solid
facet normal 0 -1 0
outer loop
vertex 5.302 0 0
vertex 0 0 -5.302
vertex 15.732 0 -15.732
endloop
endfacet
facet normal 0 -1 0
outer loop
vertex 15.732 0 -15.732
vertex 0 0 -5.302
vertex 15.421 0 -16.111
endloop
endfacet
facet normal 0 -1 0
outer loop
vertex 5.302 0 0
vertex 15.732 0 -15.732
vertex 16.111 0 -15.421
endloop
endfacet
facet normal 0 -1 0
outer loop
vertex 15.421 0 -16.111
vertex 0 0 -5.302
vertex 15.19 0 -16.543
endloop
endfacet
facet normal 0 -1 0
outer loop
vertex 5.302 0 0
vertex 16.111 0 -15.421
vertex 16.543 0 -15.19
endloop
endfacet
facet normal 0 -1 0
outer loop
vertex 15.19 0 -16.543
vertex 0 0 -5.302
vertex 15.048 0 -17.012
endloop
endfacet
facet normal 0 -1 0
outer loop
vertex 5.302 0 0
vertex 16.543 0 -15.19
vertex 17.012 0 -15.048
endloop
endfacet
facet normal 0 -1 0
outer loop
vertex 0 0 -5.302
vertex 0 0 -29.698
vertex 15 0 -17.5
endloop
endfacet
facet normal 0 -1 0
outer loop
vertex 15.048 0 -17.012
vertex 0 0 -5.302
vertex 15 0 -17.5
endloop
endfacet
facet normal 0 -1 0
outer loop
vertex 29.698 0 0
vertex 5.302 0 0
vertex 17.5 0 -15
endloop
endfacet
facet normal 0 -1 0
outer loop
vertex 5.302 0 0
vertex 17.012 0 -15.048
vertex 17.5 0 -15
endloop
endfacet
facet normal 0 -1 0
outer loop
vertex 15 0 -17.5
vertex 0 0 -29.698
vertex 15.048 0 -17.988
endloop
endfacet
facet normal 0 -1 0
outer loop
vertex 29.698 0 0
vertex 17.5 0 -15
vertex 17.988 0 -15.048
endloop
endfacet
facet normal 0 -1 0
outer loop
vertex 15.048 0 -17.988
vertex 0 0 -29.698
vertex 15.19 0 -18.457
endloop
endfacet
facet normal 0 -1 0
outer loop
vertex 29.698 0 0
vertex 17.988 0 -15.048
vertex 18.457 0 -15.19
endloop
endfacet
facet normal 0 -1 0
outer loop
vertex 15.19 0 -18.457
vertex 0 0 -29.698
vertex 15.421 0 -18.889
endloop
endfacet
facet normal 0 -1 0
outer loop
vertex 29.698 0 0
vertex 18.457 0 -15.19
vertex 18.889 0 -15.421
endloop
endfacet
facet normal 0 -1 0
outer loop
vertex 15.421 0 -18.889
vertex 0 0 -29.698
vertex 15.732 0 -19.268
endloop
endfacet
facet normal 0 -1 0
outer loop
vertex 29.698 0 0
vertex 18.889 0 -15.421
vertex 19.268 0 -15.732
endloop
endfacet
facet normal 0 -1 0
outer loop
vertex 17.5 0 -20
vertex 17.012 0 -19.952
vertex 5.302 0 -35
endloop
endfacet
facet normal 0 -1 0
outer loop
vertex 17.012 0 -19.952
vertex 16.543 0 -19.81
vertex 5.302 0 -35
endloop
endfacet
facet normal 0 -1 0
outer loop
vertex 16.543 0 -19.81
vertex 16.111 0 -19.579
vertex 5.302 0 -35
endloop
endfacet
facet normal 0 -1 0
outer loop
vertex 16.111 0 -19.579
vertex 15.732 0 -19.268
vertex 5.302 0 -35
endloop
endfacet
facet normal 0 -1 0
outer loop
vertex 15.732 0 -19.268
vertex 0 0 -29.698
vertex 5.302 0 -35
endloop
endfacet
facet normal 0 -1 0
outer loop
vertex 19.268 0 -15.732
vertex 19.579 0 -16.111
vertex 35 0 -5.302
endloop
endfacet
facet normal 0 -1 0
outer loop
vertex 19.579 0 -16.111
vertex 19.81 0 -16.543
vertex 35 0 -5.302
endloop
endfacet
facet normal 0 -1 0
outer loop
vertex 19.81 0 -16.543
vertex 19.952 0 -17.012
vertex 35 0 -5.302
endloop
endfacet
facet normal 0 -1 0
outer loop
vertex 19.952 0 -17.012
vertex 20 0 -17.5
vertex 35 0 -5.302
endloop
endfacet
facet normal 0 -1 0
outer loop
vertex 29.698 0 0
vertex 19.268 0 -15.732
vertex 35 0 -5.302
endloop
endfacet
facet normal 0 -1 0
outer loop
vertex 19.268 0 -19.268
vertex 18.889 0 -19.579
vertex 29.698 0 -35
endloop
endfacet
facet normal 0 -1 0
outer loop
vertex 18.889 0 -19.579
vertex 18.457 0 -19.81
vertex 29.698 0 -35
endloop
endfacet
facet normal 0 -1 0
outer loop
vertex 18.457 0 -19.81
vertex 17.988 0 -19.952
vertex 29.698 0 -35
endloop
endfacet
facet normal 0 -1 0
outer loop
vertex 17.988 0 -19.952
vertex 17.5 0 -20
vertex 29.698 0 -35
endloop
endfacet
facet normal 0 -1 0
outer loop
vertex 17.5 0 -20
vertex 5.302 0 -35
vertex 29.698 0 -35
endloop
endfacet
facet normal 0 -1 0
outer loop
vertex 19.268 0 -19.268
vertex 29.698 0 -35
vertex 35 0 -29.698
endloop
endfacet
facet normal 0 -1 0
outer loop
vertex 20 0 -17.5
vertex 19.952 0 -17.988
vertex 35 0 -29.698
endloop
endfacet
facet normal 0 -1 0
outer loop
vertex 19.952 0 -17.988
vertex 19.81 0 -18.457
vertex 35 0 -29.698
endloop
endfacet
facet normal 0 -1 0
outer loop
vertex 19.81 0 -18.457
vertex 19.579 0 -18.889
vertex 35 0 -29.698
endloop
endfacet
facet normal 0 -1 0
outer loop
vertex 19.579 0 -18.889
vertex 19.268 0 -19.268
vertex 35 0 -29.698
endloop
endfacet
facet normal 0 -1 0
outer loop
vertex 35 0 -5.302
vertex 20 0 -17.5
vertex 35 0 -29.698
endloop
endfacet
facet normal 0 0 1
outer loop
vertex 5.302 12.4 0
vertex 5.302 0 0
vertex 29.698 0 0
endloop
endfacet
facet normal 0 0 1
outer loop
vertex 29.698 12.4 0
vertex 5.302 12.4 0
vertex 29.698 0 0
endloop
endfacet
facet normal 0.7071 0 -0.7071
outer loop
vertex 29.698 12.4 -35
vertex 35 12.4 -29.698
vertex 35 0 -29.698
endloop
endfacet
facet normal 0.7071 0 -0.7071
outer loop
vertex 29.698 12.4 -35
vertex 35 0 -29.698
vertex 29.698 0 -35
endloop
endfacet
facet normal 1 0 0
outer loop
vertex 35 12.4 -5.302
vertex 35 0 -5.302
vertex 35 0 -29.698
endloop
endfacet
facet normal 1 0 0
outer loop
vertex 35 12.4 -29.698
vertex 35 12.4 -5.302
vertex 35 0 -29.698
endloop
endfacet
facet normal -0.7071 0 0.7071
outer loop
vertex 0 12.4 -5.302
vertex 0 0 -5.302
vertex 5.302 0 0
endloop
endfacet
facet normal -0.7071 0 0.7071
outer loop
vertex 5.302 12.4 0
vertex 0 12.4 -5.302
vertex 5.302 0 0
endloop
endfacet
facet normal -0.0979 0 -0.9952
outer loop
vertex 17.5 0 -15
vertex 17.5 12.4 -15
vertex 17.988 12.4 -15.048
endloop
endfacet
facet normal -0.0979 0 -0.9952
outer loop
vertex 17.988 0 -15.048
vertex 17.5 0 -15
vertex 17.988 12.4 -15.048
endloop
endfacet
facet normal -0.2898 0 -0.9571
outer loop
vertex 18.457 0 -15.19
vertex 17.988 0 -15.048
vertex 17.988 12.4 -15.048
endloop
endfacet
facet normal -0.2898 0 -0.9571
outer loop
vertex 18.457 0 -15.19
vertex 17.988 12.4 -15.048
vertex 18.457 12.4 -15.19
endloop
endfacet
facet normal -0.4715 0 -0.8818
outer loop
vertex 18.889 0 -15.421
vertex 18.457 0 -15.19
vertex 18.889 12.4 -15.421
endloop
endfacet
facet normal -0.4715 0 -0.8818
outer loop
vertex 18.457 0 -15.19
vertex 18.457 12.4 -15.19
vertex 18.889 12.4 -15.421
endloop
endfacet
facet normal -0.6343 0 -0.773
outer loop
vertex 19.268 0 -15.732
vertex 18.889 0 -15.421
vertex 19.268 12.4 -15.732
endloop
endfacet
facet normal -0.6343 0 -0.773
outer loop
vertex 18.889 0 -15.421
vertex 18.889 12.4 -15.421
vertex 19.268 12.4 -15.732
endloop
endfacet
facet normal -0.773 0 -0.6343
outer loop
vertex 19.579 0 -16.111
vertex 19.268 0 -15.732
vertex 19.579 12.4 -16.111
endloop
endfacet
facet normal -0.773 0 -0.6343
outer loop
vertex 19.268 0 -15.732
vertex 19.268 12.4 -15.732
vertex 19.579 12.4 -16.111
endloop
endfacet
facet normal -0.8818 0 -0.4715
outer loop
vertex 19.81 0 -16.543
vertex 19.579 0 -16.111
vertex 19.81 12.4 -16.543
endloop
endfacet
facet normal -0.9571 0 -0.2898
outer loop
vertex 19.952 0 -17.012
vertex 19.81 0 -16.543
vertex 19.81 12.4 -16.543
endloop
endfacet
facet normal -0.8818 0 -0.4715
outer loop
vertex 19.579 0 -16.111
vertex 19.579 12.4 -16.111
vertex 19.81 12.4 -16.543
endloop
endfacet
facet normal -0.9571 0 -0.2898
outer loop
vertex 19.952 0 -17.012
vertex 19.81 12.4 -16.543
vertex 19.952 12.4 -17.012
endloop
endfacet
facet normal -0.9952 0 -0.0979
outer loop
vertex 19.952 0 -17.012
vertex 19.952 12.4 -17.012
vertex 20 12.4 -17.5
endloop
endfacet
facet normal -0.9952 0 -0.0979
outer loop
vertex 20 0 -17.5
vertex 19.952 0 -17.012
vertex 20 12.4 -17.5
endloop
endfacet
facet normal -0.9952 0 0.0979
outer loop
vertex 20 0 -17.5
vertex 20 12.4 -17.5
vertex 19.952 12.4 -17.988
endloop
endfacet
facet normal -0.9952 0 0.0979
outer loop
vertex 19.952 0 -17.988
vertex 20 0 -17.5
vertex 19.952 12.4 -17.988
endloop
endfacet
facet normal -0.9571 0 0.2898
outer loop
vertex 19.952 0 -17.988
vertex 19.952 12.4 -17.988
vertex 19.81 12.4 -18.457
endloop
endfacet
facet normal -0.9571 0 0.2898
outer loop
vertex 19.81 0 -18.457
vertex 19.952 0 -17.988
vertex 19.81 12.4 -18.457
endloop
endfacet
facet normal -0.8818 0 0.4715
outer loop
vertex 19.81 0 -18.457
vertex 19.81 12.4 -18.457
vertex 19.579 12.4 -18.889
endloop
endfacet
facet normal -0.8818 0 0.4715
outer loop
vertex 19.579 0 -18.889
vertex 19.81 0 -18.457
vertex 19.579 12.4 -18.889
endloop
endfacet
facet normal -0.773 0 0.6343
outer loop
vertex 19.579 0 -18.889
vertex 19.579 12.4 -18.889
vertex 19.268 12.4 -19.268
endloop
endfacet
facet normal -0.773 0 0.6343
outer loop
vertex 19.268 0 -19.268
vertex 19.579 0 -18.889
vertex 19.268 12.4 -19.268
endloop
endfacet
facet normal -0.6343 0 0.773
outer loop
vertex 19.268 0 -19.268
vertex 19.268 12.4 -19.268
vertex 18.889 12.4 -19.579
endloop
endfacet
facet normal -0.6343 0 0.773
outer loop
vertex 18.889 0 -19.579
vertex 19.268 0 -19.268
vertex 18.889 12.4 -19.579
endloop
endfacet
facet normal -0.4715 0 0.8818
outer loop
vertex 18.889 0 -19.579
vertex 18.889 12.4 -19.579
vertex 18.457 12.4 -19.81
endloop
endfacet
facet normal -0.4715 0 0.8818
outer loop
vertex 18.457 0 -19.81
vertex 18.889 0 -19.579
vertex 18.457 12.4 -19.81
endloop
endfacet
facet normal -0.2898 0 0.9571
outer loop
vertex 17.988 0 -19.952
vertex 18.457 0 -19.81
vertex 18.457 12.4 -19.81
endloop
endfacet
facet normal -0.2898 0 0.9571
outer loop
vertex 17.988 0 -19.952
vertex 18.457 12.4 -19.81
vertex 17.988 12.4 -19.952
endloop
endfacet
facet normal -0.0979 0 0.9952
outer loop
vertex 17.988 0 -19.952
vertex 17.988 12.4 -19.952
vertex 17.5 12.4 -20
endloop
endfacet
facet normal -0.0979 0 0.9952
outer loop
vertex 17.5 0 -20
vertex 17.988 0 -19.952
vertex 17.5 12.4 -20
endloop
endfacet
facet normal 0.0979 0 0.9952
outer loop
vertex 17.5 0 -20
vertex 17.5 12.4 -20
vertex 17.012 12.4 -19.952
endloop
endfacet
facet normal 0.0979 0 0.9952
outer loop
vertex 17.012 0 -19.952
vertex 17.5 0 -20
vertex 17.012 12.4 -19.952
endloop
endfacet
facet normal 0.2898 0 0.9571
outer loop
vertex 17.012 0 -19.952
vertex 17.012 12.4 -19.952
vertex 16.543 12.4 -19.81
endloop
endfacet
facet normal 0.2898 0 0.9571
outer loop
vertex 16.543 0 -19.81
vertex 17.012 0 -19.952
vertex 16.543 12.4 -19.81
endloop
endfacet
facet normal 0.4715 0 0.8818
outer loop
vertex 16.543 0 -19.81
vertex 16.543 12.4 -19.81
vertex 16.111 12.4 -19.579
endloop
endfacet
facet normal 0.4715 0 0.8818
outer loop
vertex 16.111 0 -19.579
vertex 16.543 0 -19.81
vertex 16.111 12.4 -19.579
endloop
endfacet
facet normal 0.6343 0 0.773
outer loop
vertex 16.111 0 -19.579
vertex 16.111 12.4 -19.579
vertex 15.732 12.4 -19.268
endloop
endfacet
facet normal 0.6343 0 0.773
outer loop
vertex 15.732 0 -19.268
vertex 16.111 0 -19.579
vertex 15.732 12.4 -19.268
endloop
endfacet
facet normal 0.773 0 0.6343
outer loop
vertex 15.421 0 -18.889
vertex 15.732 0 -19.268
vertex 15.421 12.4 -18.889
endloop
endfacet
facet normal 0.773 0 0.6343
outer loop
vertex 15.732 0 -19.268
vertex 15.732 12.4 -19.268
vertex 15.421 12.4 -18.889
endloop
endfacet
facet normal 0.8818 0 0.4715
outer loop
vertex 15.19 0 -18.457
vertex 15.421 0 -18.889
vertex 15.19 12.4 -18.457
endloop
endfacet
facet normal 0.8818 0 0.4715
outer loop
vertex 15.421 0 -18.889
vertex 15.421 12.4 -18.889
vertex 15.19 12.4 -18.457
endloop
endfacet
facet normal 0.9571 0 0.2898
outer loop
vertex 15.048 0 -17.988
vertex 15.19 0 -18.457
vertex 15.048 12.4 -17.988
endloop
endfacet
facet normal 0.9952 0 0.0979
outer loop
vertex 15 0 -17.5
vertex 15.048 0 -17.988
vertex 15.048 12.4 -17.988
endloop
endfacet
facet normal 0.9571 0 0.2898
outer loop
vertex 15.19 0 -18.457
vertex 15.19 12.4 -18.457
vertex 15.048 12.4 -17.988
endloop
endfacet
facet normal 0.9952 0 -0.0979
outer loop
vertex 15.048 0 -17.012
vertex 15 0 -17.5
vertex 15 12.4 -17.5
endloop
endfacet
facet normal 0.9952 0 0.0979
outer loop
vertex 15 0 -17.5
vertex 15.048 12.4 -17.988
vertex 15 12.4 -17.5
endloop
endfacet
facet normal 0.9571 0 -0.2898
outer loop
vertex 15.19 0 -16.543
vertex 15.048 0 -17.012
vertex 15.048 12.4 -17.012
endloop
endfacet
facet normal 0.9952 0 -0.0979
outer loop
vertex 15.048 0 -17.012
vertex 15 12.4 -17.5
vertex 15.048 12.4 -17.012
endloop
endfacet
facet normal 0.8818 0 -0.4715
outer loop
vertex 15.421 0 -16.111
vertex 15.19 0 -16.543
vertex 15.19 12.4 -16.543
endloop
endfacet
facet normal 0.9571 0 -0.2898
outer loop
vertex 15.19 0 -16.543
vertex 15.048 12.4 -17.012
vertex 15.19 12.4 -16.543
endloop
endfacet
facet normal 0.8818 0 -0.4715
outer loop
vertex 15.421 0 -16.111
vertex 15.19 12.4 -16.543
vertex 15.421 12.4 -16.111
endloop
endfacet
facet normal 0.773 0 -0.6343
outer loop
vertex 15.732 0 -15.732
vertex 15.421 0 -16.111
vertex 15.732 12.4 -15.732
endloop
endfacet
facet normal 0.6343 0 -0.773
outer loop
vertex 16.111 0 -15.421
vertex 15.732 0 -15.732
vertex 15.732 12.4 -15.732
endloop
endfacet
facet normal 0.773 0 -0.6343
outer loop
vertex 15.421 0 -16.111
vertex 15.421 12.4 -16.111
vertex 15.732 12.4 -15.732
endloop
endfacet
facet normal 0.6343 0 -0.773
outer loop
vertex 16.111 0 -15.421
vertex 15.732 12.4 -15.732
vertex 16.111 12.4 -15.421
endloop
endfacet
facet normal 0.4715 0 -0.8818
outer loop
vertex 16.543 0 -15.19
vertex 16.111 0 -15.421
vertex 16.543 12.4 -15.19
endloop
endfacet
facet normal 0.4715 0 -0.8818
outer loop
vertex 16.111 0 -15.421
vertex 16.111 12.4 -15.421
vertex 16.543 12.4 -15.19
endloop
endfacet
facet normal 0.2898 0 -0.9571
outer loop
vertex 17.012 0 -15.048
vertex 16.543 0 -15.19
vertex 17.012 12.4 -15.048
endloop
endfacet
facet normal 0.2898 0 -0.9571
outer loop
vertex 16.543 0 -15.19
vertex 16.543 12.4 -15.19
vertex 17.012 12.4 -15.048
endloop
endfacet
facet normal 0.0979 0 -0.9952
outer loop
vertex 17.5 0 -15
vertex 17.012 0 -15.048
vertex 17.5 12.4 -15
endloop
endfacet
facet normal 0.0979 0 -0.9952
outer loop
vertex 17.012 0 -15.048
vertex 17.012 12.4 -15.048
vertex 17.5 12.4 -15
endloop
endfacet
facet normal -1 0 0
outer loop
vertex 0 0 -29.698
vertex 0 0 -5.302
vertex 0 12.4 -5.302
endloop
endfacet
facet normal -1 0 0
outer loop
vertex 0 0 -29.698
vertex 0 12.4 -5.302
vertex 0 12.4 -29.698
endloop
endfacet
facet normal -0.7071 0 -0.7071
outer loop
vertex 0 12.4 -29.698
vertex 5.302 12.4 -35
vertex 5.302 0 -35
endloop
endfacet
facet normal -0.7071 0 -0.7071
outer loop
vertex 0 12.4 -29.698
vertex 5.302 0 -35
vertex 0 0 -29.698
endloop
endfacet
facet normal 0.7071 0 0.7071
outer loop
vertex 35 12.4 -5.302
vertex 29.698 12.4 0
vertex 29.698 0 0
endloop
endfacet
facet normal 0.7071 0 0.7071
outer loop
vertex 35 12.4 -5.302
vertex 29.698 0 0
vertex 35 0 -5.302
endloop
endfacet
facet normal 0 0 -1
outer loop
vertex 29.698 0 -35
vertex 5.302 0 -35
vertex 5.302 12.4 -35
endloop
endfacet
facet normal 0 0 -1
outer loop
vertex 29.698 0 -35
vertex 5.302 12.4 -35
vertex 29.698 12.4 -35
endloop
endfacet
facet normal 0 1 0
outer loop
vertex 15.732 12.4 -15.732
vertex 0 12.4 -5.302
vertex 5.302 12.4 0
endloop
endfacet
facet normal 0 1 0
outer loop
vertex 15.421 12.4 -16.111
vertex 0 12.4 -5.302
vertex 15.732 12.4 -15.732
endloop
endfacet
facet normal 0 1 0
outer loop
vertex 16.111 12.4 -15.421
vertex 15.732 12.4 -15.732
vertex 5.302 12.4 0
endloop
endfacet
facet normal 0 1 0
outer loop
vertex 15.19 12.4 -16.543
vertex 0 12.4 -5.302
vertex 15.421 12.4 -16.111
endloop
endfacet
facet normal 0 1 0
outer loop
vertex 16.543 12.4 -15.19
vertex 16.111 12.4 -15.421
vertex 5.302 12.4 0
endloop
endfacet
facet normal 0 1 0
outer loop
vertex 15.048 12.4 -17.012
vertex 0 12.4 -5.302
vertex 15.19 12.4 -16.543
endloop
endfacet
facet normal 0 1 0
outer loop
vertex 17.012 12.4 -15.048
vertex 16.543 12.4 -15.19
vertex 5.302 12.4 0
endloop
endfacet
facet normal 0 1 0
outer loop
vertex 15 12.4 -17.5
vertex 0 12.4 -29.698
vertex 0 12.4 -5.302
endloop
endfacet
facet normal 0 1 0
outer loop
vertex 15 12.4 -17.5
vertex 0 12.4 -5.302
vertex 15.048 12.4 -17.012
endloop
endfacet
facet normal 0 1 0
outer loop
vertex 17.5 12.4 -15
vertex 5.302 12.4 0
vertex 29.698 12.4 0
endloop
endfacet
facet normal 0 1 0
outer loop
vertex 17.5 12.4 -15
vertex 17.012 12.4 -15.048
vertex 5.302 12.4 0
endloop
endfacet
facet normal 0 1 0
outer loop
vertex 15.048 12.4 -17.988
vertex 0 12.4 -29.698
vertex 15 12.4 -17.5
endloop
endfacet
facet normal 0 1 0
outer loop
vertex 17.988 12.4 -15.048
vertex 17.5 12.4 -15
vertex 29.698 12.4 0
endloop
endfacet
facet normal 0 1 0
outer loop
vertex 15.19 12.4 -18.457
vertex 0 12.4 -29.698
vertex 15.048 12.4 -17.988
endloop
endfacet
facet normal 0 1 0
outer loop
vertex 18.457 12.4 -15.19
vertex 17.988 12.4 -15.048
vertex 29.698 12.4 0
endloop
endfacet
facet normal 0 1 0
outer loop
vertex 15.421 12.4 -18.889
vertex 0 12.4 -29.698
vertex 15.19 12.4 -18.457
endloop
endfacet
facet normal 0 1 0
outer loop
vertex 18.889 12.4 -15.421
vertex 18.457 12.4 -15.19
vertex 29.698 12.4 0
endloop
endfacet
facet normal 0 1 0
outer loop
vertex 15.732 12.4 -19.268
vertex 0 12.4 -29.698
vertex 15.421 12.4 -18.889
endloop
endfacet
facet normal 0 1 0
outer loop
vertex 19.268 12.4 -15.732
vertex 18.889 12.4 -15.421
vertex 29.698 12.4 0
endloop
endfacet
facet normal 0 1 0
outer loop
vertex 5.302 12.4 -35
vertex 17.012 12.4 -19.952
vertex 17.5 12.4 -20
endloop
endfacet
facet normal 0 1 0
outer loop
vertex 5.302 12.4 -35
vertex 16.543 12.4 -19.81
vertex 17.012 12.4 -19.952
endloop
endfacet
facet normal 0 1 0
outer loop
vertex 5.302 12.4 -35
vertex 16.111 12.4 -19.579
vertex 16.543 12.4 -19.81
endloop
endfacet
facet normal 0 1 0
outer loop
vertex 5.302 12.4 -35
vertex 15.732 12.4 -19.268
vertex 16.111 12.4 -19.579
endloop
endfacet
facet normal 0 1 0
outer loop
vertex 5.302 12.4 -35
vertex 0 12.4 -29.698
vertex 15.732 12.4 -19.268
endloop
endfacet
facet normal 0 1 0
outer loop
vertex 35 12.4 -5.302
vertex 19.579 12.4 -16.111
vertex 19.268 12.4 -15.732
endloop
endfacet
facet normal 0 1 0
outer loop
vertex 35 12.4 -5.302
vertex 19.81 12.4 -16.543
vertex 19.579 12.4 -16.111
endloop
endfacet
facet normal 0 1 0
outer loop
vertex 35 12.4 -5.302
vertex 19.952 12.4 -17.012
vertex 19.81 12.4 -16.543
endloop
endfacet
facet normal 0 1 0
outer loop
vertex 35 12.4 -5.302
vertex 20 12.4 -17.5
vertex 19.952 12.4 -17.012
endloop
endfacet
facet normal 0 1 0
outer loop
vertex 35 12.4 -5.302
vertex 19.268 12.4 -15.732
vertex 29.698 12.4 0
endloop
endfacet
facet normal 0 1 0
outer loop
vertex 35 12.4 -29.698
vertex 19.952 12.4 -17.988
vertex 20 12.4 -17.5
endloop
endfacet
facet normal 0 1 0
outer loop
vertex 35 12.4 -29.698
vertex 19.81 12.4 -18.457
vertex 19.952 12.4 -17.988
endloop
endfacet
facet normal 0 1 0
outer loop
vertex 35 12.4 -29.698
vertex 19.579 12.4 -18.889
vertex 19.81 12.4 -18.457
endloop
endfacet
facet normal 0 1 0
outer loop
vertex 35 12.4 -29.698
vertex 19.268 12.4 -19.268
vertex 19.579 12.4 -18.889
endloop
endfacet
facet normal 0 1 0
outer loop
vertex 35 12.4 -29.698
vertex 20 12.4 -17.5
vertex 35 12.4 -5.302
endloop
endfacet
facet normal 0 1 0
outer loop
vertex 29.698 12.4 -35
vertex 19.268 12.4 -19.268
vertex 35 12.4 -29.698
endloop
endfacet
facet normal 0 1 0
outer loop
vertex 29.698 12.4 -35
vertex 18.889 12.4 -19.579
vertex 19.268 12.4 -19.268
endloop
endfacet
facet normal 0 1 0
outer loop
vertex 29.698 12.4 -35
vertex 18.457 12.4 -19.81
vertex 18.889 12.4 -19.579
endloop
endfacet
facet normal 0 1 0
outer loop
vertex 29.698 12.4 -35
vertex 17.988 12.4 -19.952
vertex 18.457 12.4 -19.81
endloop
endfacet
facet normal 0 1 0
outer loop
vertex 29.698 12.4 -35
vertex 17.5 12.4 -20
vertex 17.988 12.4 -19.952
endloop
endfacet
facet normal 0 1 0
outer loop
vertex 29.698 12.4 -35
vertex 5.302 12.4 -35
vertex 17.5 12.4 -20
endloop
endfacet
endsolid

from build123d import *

# Parameters (mm, degrees)
CROQUIS1_W              = 35
CROQUIS1_H              = 35
SALIENTE_EXTRUIR1_DEPTH = 12.4
CROQUIS2_OUTSIDE_W      = 47.206
CROQUIS2_OUTSIDE_H      = 47.206
CORTAR_EXTRUIR2_DEPTH   = 18
CROQUIS3_R              = 2.5
CORTAR_EXTRUIR3_DEPTH   = 52.027051649


with BuildPart() as part:
    # Croquis1 → Saliente-Extruir1 (new body)
    with BuildSketch(Plane(origin=(0, 0, 0), x_dir=(1, 0, 0), z_dir=(0, 1, 0))):
        with Locations((17.5, 17.5)):
            Rectangle(CROQUIS1_W, CROQUIS1_H)
    extrude(amount=SALIENTE_EXTRUIR1_DEPTH)

    # Croquis2 outside → Cortar-Extruir2 (cut)
    with BuildSketch(Plane(origin=(0, 12.4, 0), x_dir=(1, 0, 0), z_dir=(0, 1, 0))):
        with Locations((17.5, 17.5)):
            Rectangle(CROQUIS2_OUTSIDE_W, CROQUIS2_OUTSIDE_H)
        Polygon((5.30151519, 35), (0, 29.69848481), (0, 5.30151519), (5.30151519, 0), (29.69848481, 0), (35, 5.30151519), (35, 29.69848481), (29.69848481, 35), align=None, mode=Mode.SUBTRACT)
    extrude(amount=-CORTAR_EXTRUIR2_DEPTH, mode=Mode.SUBTRACT)

    # Croquis3 → Cortar-Extruir3 (cut, through all)
    with BuildSketch(Plane(origin=(0, 12.4, 0), x_dir=(1, 0, 0), z_dir=(0, 1, 0))):
        with Locations(Location((17.5, 17.5, 0), (0, 0, 270))):
            Circle(CROQUIS3_R)
    extrude(amount=-CORTAR_EXTRUIR3_DEPTH, mode=Mode.SUBTRACT)


solid = part.part
